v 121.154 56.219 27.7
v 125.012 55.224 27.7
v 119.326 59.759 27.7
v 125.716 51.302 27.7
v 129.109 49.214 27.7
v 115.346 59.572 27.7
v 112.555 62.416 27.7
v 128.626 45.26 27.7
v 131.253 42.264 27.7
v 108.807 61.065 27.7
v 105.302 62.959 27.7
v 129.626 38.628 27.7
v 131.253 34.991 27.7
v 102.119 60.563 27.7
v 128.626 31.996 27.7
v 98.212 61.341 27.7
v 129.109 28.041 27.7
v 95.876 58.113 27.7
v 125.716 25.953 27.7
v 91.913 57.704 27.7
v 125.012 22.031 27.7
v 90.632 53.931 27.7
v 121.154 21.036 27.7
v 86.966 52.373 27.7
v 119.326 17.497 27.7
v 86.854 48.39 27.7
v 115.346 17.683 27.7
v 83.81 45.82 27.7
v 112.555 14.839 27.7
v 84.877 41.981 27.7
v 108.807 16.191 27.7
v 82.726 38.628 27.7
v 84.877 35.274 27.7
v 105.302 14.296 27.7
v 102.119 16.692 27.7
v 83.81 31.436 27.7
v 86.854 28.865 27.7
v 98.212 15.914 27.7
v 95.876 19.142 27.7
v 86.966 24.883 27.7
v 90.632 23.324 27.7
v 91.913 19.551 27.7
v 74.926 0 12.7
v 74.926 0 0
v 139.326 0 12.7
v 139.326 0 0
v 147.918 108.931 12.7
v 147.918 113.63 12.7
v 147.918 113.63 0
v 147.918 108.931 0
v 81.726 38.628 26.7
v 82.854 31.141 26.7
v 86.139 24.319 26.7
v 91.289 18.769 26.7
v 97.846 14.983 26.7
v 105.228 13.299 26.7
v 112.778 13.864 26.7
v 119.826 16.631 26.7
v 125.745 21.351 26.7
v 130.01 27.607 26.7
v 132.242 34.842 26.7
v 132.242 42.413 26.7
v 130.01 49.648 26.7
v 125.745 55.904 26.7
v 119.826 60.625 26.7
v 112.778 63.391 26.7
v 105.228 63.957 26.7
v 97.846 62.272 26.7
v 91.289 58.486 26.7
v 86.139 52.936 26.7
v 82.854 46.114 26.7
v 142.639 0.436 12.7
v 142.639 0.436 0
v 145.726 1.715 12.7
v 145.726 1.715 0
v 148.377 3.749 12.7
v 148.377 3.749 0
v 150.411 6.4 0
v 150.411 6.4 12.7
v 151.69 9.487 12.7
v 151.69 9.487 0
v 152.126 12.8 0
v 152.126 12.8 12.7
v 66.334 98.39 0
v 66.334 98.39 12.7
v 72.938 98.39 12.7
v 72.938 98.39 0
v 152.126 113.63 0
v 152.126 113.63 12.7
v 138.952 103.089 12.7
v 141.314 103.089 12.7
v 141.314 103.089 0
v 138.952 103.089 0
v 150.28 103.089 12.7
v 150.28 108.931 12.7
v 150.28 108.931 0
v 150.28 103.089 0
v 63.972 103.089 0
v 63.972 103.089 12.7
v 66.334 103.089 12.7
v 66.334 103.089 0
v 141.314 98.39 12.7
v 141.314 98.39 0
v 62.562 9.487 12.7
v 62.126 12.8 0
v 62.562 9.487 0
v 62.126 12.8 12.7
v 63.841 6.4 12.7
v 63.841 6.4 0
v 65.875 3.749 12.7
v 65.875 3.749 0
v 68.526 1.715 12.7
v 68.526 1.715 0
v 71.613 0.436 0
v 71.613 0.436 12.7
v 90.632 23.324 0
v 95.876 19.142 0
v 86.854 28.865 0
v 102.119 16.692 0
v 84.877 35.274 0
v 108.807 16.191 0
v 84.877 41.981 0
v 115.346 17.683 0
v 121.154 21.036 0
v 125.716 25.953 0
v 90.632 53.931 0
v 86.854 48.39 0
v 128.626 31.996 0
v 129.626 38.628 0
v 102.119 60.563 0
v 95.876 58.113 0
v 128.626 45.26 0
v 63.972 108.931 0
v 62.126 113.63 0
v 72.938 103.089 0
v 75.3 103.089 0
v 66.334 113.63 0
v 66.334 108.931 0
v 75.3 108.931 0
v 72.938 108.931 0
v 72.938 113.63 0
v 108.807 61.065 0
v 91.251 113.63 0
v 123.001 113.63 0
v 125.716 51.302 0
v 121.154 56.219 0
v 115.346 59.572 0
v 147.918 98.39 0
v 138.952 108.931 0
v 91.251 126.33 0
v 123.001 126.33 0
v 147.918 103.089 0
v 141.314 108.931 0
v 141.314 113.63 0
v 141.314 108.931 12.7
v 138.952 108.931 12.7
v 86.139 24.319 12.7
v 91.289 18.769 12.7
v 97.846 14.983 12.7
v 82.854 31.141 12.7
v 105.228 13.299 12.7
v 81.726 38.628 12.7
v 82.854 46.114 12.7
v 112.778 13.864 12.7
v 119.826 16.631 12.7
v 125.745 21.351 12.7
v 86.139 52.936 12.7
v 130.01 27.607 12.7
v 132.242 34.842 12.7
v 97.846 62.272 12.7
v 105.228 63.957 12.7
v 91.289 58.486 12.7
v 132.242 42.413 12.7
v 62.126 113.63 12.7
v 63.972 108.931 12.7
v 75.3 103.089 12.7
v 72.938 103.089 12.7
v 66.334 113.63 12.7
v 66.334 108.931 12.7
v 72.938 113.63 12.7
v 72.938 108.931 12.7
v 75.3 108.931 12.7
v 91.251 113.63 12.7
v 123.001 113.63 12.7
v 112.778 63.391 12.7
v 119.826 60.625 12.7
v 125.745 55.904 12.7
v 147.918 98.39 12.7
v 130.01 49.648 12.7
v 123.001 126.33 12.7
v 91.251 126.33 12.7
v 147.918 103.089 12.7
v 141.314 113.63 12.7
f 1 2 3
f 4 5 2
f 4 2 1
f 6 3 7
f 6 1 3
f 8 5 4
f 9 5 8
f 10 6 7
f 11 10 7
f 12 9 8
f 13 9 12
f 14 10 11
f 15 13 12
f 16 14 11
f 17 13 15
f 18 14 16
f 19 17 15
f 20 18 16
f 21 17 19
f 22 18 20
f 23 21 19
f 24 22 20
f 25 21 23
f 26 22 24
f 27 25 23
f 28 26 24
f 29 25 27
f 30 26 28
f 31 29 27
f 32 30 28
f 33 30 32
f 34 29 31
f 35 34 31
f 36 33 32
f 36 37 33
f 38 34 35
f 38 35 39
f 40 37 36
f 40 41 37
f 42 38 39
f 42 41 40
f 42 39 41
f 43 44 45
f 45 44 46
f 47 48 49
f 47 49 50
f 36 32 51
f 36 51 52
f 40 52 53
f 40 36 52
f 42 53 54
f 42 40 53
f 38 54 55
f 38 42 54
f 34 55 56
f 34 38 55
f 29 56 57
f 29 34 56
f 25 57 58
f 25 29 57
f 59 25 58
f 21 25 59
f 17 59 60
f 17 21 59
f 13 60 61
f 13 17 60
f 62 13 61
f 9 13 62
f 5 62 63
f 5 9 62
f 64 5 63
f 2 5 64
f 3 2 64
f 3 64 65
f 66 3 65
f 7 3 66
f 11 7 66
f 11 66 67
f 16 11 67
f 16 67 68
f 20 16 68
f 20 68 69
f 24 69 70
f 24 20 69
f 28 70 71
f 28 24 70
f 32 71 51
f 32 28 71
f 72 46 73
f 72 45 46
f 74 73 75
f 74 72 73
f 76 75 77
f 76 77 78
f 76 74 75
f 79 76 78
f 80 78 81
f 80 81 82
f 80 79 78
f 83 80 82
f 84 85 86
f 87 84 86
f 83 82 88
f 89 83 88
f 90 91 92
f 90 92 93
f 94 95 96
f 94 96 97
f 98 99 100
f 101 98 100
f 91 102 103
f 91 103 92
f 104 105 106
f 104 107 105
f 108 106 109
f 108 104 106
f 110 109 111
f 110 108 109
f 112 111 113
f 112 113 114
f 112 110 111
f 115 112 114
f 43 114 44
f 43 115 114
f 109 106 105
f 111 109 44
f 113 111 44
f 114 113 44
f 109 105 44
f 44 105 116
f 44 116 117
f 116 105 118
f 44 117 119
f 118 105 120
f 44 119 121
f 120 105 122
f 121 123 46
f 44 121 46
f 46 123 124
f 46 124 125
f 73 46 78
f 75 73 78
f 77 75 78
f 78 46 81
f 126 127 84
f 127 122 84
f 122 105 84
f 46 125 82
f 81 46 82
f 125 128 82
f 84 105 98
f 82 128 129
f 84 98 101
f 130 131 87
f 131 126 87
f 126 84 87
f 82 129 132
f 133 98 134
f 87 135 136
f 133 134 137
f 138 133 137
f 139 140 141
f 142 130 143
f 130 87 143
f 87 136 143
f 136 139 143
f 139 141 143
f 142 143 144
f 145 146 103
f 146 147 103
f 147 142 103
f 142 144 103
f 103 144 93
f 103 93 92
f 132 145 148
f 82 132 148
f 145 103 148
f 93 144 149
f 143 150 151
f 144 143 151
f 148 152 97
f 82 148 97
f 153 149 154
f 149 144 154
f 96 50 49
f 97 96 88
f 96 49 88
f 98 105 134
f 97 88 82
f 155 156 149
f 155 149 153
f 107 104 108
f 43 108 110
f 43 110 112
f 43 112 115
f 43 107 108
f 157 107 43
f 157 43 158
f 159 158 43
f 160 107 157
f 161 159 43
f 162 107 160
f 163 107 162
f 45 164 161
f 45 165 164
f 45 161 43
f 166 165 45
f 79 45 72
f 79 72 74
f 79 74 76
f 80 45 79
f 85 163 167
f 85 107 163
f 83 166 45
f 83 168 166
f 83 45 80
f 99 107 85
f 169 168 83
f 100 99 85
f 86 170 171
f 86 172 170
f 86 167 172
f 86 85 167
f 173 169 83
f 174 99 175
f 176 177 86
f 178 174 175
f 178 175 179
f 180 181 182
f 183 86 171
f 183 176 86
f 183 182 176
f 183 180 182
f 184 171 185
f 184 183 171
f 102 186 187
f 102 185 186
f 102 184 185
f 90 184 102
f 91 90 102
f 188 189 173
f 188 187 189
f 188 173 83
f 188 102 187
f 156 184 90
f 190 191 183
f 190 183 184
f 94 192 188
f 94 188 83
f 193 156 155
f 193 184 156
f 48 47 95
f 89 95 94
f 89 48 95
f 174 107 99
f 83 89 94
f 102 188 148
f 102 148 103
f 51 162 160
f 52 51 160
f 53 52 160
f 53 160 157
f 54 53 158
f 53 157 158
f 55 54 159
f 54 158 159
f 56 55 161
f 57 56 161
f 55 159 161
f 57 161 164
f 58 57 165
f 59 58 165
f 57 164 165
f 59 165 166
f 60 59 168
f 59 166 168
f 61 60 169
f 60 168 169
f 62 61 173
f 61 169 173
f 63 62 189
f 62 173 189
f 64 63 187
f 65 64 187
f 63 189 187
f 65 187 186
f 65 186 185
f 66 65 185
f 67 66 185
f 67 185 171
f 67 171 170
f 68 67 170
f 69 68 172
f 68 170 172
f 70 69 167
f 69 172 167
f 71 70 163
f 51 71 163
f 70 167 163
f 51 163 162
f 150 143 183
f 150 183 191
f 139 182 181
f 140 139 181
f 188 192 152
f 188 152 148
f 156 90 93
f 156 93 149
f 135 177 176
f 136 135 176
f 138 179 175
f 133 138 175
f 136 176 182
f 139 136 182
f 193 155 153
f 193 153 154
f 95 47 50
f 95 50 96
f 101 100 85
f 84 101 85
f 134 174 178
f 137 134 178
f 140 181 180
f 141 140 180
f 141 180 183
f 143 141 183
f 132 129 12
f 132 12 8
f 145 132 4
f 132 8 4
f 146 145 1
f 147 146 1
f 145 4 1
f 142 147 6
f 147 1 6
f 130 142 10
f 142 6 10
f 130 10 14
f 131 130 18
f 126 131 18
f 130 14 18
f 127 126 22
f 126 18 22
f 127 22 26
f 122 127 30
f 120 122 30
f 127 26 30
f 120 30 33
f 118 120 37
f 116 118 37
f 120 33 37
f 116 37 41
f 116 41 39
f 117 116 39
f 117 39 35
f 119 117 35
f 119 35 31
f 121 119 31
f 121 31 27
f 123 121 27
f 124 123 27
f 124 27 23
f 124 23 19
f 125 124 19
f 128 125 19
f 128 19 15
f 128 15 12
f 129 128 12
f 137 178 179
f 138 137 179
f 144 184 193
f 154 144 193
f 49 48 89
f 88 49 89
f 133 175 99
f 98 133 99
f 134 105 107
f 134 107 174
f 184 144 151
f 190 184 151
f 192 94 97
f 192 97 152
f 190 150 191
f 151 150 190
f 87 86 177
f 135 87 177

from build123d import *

# Parameters (mm, degrees)
SKETCH12_W           = 90
SKETCH12_H           = 126.33
BOSS_EXTRUDE10_DEPTH = 12.7
SKETCH15_R           = 25.4
BOSS_EXTRUDE11_DEPTH = 15
SKETCH23_R           = 22.5
CUT_EXTRUDE7_DEPTH   = 200.671813095
FILLET2_R            = 12.8
SKETCH25_W           = 29.125
SKETCH25_H           = 12.7
CUT_EXTRUDE9_DEPTH   = 199.309210439
CUT_EXTRUDE10_DEPTH  = 199.309210439
CHAMFER1_SIZE        = 1


with BuildPart() as part:
    # Sketch12 → Boss-Extrude10 (new body)
    with BuildSketch(Plane.XY):
        with Locations((107.125849364, 63.165)):
            Rectangle(SKETCH12_W, SKETCH12_H)
    extrude(amount=BOSS_EXTRUDE10_DEPTH)

    # Sketch15 → Boss-Extrude11 (add)
    with BuildSketch(Plane.XY.offset(12.7)):
        with Locations((107.125849364, 38.627603634)):
            Circle(SKETCH15_R)
    extrude(amount=BOSS_EXTRUDE11_DEPTH)

    # Sketch23 → Cut-Extrude7 (cut, through all)
    with BuildSketch(Plane.XY.offset(27.7)):
        with Locations((107.125849364, 38.627603634)):
            Circle(SKETCH23_R)
    extrude(amount=-CUT_EXTRUDE7_DEPTH, mode=Mode.SUBTRACT)

    # Fillet2
    fillet2_edges = [part.edges().sort_by_distance(p)[0] for p in [
        (152.125849364, 0, 6.35),
        (62.125849364, 0, 6.35),
    ]]
    fillet(fillet2_edges, radius=FILLET2_R)

    # Sketch25 → Cut-Extrude9 (cut, through all)
    with BuildSketch(Plane.XY.offset(12.7)):
        with Locations((137.563349364, 119.98)):
            Rectangle(SKETCH25_W, SKETCH25_H)
        with Locations((76.688349364, 119.98)):
            Rectangle(SKETCH25_W, SKETCH25_H)
    extrude(amount=-CUT_EXTRUDE9_DEPTH, mode=Mode.SUBTRACT)

    # Sketch27 → Cut-Extrude10 (cut, through all)
    with BuildSketch(Plane.XY.offset(12.7)):
        Polygon((147.917849364, 113.63), (147.917849364, 108.931), (150.279849364, 108.931), (150.279849364, 103.089), (147.917849364, 103.089), (147.917849364, 98.39), (141.313849364, 98.39), (141.313849364, 103.089), (138.951849364, 103.089), (138.951849364, 108.931), (141.313849364, 108.931), (141.313849364, 113.63), align=None)
        Polygon((72.937849364, 103.089), (75.299849364, 103.089), (75.299849364, 108.931), (72.937849364, 108.931), (72.937849364, 113.63), (66.333849364, 113.63), (66.333849364, 108.931), (63.971849364, 108.931), (63.971849364, 103.089), (66.333849364, 103.089), (66.333849364, 98.39), (72.937849364, 98.39), align=None)
    extrude(amount=-CUT_EXTRUDE10_DEPTH, mode=Mode.SUBTRACT)

    # Chamfer1
    chamfer1_edges = [part.edges().sort_by_distance(p)[0] for p in [
        (81.725849364, 38.627603634, 27.7),
    ]]
    chamfer(chamfer1_edges, length=CHAMFER1_SIZE)


solid = part.part
